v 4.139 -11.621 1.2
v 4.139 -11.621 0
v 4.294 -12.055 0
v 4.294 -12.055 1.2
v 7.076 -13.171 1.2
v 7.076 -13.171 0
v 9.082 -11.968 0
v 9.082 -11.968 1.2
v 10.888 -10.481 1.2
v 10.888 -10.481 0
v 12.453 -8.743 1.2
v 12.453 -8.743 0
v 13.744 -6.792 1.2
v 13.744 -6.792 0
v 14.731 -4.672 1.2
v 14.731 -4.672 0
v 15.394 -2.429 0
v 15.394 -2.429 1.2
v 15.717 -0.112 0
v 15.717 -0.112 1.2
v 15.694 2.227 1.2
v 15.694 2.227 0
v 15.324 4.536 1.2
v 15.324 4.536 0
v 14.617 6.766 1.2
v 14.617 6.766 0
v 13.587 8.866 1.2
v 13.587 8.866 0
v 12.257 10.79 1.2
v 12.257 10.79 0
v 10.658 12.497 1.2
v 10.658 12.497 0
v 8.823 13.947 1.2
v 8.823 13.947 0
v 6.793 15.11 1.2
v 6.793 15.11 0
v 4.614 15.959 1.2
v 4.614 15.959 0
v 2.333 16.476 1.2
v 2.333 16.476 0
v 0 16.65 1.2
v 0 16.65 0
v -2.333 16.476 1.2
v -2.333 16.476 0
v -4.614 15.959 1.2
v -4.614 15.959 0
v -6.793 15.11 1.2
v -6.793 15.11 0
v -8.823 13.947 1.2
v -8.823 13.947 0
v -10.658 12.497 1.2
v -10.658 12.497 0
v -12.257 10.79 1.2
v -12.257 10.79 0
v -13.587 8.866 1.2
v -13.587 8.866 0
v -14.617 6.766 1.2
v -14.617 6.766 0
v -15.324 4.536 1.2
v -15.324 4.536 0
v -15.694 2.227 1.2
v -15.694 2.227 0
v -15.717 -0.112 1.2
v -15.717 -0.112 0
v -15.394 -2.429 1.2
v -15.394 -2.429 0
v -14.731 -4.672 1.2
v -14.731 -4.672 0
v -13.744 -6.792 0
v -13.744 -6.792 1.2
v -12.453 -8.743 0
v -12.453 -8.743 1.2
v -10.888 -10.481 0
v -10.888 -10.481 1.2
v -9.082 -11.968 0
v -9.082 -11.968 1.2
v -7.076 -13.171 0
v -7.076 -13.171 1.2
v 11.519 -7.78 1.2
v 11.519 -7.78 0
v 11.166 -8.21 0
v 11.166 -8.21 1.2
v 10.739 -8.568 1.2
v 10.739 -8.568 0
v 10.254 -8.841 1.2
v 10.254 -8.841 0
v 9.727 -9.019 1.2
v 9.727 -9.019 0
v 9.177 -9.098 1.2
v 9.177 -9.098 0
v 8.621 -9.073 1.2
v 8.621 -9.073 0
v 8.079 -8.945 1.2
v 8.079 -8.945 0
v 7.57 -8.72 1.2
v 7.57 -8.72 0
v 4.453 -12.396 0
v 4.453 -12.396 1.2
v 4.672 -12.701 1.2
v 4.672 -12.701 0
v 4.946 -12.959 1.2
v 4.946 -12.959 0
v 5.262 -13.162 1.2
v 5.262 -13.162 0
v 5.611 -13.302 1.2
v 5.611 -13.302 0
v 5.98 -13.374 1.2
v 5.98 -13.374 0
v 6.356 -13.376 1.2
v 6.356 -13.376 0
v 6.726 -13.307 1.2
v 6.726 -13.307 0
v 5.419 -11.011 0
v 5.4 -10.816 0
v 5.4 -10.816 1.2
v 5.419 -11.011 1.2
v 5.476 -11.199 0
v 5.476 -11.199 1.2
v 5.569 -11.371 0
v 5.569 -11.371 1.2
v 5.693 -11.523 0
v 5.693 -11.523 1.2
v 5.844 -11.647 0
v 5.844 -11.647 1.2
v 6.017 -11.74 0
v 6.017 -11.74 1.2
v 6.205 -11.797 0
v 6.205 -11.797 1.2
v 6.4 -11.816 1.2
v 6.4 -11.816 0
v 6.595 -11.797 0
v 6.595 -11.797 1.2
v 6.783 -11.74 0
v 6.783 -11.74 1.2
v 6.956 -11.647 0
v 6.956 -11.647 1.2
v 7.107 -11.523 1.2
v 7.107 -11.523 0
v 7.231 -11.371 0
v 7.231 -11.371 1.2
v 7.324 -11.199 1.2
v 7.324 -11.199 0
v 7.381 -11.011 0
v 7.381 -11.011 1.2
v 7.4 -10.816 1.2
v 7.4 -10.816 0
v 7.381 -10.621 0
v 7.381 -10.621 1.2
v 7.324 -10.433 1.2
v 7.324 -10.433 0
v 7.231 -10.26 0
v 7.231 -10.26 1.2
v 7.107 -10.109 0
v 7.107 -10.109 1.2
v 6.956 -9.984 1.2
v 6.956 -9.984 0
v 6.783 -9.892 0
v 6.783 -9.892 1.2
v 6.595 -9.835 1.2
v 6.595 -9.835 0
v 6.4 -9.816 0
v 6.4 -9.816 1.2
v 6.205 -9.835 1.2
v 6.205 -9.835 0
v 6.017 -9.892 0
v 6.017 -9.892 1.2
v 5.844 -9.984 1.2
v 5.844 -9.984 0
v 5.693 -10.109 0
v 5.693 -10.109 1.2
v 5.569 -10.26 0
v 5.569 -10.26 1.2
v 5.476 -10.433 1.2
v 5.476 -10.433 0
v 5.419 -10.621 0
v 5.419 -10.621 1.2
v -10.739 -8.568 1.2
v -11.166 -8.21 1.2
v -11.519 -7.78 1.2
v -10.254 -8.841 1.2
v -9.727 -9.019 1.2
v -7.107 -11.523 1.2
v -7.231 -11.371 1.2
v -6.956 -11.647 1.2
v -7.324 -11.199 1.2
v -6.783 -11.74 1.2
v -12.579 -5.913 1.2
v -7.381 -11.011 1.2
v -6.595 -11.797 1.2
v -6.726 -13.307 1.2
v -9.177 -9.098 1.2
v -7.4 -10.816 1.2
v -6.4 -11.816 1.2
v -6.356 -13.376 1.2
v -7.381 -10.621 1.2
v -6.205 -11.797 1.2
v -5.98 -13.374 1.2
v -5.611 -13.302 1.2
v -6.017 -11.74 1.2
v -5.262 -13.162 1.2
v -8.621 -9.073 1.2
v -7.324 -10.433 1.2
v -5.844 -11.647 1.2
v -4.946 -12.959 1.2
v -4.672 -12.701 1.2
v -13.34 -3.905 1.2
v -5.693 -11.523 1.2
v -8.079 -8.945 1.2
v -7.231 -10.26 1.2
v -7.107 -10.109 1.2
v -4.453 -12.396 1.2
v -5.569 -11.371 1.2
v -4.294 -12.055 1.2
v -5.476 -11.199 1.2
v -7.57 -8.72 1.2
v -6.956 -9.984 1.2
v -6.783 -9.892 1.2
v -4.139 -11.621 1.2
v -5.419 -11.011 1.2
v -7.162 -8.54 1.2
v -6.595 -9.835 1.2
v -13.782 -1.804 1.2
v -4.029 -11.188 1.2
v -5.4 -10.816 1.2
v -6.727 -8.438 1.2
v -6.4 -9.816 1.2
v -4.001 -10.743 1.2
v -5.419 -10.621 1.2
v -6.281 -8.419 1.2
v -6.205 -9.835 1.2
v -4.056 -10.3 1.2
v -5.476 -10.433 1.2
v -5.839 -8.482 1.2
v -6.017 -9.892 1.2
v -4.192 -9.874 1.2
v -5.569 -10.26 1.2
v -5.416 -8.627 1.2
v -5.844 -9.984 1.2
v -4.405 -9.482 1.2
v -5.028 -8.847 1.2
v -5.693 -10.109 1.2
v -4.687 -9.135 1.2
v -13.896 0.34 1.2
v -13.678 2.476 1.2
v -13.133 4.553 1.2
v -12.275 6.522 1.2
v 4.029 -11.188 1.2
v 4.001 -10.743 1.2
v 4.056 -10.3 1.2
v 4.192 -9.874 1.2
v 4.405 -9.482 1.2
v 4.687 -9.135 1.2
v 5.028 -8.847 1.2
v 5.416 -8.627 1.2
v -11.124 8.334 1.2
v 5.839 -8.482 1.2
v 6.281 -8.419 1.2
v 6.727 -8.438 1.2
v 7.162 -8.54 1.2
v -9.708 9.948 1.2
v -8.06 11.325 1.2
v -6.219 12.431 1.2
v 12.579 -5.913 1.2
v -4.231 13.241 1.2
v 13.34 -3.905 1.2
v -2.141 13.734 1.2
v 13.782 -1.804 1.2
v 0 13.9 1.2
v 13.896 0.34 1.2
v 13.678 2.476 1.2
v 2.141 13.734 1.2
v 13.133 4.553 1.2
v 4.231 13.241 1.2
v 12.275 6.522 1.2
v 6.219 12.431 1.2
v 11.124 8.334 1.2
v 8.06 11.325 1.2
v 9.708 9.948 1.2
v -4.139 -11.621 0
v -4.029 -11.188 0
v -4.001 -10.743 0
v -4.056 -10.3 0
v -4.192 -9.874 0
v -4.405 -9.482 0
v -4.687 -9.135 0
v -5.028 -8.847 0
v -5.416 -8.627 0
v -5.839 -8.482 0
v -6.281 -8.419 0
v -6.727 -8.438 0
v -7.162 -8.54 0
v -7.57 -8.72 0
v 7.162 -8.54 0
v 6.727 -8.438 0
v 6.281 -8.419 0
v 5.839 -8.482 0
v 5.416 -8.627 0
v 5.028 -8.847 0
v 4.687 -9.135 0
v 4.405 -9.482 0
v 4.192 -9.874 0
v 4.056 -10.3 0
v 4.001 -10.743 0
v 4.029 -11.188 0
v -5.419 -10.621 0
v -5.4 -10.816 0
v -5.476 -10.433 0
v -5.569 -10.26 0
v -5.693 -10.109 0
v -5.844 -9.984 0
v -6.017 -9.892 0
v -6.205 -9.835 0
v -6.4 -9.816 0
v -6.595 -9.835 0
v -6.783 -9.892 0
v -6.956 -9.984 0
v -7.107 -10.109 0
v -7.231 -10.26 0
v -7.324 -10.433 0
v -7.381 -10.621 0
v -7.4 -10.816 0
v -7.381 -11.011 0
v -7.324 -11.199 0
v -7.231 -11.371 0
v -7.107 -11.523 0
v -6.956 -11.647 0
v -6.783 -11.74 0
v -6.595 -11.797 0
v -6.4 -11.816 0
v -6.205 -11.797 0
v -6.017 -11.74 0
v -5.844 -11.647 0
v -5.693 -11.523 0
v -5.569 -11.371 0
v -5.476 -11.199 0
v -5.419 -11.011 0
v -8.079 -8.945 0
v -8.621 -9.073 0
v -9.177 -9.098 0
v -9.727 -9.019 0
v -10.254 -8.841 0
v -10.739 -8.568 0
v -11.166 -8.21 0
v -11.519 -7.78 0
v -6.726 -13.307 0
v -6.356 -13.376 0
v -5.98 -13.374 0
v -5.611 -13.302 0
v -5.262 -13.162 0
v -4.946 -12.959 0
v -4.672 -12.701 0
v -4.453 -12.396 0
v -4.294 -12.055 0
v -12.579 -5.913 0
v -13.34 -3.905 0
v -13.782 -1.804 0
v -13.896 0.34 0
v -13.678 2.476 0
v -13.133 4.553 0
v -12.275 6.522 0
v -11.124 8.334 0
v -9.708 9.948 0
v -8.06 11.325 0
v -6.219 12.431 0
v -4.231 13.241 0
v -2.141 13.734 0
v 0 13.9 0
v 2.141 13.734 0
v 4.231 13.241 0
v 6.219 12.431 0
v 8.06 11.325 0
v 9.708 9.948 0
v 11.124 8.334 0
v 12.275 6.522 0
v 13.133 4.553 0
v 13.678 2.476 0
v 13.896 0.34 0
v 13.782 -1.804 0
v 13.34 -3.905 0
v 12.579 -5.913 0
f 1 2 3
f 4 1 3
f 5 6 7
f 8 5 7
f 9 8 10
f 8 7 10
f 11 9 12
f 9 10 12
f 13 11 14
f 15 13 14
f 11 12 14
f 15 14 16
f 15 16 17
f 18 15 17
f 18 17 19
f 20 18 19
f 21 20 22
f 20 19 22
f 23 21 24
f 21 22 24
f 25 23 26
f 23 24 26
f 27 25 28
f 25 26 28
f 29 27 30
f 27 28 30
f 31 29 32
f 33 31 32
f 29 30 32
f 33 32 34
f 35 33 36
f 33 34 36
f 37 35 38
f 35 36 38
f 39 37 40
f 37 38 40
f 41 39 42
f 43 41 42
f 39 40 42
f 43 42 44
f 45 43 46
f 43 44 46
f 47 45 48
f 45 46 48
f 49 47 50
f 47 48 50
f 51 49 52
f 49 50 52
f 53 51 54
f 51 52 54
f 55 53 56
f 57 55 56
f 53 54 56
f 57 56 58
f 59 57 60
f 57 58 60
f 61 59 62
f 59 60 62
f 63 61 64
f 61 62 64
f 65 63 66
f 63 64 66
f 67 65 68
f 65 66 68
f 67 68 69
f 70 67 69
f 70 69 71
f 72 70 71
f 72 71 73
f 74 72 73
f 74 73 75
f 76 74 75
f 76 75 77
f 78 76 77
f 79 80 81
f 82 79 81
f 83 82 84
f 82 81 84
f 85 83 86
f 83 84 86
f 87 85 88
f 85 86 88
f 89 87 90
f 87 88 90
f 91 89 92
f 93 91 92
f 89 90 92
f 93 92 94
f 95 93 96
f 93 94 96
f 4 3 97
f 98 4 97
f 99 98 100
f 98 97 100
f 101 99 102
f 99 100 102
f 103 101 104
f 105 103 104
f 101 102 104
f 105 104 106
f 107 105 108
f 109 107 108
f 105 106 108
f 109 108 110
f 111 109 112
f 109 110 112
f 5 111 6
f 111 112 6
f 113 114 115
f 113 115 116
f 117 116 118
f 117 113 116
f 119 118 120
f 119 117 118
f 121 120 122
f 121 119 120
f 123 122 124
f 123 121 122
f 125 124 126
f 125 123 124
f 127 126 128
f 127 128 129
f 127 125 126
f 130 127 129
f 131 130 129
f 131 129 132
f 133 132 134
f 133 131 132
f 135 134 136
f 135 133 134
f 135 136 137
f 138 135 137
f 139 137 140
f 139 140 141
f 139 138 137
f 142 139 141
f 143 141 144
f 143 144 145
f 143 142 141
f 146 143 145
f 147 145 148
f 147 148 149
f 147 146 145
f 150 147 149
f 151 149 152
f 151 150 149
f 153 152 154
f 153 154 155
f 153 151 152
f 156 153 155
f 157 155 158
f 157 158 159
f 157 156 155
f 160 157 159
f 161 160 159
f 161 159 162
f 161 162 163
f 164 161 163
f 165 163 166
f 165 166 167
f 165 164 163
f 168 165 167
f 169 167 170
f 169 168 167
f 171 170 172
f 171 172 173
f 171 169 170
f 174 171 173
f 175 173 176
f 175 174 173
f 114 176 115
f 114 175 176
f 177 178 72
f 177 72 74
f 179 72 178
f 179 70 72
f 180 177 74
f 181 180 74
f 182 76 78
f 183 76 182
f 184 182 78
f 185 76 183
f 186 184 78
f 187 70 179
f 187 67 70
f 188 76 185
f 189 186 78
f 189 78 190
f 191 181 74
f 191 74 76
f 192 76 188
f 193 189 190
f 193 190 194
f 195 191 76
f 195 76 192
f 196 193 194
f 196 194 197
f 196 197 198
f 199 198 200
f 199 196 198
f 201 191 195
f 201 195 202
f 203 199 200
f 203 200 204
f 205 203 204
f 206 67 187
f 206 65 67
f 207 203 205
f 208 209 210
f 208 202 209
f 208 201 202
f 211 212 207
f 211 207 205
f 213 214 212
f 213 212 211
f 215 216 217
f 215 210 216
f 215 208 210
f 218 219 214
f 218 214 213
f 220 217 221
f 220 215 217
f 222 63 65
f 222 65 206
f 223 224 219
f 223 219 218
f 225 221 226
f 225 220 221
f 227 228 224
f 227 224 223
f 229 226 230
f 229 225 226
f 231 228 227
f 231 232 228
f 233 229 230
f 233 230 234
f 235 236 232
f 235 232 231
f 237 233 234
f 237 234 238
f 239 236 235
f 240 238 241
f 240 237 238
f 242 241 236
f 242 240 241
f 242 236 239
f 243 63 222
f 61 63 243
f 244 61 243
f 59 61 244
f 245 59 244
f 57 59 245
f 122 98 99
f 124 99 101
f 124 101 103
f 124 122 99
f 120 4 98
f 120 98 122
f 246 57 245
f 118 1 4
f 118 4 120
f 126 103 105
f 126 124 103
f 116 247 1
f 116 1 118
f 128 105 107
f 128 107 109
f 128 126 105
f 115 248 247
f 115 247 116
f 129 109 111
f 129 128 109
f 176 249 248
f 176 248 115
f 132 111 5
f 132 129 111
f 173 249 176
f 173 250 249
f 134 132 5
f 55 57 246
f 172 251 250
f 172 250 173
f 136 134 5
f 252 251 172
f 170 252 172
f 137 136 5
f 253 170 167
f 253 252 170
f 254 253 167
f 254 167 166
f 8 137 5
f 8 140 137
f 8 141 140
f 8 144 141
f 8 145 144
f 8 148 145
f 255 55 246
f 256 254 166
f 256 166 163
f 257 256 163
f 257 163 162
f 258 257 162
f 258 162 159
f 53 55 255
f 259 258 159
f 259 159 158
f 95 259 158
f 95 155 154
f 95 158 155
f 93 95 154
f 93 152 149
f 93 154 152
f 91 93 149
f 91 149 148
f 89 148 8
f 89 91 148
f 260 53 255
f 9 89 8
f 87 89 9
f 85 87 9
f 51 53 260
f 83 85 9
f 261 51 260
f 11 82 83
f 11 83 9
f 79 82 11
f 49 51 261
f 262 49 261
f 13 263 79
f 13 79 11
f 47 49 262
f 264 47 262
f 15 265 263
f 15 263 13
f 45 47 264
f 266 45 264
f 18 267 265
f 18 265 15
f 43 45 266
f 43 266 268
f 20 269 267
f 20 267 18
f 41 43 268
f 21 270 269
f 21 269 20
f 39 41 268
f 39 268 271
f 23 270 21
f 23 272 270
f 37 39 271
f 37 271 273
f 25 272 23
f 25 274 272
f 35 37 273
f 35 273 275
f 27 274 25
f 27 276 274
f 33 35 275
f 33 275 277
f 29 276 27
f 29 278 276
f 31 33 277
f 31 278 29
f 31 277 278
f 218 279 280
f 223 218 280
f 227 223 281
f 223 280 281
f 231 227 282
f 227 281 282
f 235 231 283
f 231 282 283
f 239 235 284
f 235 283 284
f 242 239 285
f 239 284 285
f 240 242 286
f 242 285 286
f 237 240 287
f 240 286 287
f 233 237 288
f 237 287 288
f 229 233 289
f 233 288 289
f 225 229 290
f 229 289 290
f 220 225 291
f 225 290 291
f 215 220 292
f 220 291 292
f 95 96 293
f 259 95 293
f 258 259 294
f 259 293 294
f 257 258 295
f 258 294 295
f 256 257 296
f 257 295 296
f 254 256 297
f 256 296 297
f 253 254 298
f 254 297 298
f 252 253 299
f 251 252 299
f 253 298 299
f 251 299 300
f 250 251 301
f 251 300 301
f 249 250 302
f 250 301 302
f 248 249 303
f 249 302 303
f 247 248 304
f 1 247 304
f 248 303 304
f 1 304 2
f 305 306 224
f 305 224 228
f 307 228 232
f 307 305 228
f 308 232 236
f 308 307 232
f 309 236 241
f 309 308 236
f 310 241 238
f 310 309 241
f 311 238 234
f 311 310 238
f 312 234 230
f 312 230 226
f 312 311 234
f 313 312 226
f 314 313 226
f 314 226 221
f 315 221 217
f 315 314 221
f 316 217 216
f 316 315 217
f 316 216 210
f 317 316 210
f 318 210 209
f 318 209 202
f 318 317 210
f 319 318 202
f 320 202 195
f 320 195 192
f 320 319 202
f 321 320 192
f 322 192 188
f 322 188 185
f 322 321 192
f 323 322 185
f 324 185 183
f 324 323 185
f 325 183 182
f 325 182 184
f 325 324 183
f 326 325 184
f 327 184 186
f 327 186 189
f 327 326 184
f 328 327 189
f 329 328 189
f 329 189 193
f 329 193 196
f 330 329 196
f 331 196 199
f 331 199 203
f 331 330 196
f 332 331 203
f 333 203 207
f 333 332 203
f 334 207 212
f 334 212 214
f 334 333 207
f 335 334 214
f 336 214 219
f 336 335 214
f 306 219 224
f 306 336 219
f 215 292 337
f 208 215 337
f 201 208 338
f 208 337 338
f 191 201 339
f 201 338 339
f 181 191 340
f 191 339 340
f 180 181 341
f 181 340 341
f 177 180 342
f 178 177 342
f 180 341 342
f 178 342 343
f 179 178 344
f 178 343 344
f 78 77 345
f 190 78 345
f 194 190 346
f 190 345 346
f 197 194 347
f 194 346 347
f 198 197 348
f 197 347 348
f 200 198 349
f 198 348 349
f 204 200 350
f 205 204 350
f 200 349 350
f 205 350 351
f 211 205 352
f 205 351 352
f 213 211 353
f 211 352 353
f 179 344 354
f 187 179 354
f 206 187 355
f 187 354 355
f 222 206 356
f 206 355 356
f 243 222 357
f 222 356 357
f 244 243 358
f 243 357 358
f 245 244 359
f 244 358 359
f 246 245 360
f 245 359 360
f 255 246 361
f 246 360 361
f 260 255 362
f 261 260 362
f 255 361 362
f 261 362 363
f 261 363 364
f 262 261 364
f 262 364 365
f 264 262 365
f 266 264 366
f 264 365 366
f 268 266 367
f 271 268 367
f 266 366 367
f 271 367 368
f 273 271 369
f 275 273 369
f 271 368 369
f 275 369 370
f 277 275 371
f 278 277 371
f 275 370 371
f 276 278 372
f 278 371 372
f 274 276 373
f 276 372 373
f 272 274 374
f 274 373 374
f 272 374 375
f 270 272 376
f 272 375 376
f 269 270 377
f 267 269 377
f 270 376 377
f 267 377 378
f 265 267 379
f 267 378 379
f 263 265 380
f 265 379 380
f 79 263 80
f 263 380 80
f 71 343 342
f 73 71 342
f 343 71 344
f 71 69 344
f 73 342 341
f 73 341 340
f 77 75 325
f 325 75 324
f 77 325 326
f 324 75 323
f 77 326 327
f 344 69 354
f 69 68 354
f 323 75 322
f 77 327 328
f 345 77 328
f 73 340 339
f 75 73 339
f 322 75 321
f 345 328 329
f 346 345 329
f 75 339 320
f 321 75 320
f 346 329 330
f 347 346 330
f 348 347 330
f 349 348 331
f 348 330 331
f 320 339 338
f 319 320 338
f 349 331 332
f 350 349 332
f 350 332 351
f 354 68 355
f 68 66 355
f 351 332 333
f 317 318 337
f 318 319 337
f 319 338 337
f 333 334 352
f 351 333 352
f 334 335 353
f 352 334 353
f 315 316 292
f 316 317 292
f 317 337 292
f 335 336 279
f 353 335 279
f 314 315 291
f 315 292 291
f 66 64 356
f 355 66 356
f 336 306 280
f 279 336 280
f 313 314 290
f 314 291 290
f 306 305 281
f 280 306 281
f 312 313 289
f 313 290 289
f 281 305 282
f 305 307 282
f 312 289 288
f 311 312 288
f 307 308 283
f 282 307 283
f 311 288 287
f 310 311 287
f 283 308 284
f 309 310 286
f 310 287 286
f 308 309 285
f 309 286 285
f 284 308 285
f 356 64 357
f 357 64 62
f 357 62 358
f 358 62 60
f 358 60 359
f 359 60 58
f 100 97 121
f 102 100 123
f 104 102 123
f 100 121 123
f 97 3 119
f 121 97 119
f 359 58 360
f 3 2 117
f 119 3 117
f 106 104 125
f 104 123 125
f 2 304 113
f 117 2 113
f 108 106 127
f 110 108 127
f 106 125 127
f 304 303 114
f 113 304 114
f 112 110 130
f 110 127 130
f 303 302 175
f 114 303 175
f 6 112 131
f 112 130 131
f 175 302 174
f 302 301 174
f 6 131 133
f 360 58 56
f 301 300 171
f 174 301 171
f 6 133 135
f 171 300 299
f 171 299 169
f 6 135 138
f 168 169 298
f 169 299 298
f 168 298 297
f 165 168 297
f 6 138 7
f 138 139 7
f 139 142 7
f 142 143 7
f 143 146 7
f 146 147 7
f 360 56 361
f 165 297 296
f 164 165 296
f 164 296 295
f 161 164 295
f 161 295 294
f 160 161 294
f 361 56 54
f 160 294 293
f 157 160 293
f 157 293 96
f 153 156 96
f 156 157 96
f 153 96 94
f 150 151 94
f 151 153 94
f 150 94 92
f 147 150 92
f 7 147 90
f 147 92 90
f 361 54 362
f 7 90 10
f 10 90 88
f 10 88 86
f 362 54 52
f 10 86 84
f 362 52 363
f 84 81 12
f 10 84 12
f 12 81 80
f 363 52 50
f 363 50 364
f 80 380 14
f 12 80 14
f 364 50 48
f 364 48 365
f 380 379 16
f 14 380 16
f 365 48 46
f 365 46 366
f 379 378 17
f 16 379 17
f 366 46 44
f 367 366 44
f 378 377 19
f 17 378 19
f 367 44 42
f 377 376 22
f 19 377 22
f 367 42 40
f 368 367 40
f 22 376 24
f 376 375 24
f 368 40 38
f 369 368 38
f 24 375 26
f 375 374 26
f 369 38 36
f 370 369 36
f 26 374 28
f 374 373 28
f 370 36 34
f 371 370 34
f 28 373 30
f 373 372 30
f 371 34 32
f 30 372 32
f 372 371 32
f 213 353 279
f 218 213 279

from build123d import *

# Parameters (mm, degrees)
SKETCH1_R  = 1
BODY_DEPTH = 1.2


with BuildPart() as part:
    # Sketch1 → Body (new body)
    with BuildSketch(Plane.XY):
        with BuildLine():
            Line((4.139124405, -11.62116667), (4.293680087, -12.055103216))
            ThreePointArc((4.293680087, -12.055103216), (5.433429283, -13.240393983), (7.076323895, -13.170825851))
            ThreePointArc((7.076323895, -13.170825851), (0, 16.65), (-7.076323895, -13.170825851))
            ThreePointArc((-7.076323895, -13.170825851), (-5.433429283, -13.240393983), (-4.293680087, -12.055103216))
            Line((-4.293680087, -12.055103216), (-4.139124405, -11.62116667))
            ThreePointArc((-4.139124405, -11.62116667), (-4.850462528, -8.983168612), (-7.570021573, -8.720424866))
            ThreePointArc((-7.570021573, -8.720424866), (-9.727430565, -9.019484739), (-11.518571073, -7.780264805))
            ThreePointArc((-11.518571073, -7.780264805), (0, 13.9), (11.518571073, -7.780264805))
            ThreePointArc((11.518571073, -7.780264805), (9.727430565, -9.019484739), (7.570021573, -8.720424866))
            ThreePointArc((7.570021573, -8.720424866), (4.850462528, -8.983168612), (4.139124405, -11.62116667))
        make_face()
        with Locations((-6.4, -10.815907989)):
            Circle(SKETCH1_R, mode=Mode.SUBTRACT)
        with Locations(Location((6.4, -10.815907989, 0), (0, 0, 180))):
            Circle(SKETCH1_R, mode=Mode.SUBTRACT)
    extrude(amount=BODY_DEPTH)


solid = part.part
